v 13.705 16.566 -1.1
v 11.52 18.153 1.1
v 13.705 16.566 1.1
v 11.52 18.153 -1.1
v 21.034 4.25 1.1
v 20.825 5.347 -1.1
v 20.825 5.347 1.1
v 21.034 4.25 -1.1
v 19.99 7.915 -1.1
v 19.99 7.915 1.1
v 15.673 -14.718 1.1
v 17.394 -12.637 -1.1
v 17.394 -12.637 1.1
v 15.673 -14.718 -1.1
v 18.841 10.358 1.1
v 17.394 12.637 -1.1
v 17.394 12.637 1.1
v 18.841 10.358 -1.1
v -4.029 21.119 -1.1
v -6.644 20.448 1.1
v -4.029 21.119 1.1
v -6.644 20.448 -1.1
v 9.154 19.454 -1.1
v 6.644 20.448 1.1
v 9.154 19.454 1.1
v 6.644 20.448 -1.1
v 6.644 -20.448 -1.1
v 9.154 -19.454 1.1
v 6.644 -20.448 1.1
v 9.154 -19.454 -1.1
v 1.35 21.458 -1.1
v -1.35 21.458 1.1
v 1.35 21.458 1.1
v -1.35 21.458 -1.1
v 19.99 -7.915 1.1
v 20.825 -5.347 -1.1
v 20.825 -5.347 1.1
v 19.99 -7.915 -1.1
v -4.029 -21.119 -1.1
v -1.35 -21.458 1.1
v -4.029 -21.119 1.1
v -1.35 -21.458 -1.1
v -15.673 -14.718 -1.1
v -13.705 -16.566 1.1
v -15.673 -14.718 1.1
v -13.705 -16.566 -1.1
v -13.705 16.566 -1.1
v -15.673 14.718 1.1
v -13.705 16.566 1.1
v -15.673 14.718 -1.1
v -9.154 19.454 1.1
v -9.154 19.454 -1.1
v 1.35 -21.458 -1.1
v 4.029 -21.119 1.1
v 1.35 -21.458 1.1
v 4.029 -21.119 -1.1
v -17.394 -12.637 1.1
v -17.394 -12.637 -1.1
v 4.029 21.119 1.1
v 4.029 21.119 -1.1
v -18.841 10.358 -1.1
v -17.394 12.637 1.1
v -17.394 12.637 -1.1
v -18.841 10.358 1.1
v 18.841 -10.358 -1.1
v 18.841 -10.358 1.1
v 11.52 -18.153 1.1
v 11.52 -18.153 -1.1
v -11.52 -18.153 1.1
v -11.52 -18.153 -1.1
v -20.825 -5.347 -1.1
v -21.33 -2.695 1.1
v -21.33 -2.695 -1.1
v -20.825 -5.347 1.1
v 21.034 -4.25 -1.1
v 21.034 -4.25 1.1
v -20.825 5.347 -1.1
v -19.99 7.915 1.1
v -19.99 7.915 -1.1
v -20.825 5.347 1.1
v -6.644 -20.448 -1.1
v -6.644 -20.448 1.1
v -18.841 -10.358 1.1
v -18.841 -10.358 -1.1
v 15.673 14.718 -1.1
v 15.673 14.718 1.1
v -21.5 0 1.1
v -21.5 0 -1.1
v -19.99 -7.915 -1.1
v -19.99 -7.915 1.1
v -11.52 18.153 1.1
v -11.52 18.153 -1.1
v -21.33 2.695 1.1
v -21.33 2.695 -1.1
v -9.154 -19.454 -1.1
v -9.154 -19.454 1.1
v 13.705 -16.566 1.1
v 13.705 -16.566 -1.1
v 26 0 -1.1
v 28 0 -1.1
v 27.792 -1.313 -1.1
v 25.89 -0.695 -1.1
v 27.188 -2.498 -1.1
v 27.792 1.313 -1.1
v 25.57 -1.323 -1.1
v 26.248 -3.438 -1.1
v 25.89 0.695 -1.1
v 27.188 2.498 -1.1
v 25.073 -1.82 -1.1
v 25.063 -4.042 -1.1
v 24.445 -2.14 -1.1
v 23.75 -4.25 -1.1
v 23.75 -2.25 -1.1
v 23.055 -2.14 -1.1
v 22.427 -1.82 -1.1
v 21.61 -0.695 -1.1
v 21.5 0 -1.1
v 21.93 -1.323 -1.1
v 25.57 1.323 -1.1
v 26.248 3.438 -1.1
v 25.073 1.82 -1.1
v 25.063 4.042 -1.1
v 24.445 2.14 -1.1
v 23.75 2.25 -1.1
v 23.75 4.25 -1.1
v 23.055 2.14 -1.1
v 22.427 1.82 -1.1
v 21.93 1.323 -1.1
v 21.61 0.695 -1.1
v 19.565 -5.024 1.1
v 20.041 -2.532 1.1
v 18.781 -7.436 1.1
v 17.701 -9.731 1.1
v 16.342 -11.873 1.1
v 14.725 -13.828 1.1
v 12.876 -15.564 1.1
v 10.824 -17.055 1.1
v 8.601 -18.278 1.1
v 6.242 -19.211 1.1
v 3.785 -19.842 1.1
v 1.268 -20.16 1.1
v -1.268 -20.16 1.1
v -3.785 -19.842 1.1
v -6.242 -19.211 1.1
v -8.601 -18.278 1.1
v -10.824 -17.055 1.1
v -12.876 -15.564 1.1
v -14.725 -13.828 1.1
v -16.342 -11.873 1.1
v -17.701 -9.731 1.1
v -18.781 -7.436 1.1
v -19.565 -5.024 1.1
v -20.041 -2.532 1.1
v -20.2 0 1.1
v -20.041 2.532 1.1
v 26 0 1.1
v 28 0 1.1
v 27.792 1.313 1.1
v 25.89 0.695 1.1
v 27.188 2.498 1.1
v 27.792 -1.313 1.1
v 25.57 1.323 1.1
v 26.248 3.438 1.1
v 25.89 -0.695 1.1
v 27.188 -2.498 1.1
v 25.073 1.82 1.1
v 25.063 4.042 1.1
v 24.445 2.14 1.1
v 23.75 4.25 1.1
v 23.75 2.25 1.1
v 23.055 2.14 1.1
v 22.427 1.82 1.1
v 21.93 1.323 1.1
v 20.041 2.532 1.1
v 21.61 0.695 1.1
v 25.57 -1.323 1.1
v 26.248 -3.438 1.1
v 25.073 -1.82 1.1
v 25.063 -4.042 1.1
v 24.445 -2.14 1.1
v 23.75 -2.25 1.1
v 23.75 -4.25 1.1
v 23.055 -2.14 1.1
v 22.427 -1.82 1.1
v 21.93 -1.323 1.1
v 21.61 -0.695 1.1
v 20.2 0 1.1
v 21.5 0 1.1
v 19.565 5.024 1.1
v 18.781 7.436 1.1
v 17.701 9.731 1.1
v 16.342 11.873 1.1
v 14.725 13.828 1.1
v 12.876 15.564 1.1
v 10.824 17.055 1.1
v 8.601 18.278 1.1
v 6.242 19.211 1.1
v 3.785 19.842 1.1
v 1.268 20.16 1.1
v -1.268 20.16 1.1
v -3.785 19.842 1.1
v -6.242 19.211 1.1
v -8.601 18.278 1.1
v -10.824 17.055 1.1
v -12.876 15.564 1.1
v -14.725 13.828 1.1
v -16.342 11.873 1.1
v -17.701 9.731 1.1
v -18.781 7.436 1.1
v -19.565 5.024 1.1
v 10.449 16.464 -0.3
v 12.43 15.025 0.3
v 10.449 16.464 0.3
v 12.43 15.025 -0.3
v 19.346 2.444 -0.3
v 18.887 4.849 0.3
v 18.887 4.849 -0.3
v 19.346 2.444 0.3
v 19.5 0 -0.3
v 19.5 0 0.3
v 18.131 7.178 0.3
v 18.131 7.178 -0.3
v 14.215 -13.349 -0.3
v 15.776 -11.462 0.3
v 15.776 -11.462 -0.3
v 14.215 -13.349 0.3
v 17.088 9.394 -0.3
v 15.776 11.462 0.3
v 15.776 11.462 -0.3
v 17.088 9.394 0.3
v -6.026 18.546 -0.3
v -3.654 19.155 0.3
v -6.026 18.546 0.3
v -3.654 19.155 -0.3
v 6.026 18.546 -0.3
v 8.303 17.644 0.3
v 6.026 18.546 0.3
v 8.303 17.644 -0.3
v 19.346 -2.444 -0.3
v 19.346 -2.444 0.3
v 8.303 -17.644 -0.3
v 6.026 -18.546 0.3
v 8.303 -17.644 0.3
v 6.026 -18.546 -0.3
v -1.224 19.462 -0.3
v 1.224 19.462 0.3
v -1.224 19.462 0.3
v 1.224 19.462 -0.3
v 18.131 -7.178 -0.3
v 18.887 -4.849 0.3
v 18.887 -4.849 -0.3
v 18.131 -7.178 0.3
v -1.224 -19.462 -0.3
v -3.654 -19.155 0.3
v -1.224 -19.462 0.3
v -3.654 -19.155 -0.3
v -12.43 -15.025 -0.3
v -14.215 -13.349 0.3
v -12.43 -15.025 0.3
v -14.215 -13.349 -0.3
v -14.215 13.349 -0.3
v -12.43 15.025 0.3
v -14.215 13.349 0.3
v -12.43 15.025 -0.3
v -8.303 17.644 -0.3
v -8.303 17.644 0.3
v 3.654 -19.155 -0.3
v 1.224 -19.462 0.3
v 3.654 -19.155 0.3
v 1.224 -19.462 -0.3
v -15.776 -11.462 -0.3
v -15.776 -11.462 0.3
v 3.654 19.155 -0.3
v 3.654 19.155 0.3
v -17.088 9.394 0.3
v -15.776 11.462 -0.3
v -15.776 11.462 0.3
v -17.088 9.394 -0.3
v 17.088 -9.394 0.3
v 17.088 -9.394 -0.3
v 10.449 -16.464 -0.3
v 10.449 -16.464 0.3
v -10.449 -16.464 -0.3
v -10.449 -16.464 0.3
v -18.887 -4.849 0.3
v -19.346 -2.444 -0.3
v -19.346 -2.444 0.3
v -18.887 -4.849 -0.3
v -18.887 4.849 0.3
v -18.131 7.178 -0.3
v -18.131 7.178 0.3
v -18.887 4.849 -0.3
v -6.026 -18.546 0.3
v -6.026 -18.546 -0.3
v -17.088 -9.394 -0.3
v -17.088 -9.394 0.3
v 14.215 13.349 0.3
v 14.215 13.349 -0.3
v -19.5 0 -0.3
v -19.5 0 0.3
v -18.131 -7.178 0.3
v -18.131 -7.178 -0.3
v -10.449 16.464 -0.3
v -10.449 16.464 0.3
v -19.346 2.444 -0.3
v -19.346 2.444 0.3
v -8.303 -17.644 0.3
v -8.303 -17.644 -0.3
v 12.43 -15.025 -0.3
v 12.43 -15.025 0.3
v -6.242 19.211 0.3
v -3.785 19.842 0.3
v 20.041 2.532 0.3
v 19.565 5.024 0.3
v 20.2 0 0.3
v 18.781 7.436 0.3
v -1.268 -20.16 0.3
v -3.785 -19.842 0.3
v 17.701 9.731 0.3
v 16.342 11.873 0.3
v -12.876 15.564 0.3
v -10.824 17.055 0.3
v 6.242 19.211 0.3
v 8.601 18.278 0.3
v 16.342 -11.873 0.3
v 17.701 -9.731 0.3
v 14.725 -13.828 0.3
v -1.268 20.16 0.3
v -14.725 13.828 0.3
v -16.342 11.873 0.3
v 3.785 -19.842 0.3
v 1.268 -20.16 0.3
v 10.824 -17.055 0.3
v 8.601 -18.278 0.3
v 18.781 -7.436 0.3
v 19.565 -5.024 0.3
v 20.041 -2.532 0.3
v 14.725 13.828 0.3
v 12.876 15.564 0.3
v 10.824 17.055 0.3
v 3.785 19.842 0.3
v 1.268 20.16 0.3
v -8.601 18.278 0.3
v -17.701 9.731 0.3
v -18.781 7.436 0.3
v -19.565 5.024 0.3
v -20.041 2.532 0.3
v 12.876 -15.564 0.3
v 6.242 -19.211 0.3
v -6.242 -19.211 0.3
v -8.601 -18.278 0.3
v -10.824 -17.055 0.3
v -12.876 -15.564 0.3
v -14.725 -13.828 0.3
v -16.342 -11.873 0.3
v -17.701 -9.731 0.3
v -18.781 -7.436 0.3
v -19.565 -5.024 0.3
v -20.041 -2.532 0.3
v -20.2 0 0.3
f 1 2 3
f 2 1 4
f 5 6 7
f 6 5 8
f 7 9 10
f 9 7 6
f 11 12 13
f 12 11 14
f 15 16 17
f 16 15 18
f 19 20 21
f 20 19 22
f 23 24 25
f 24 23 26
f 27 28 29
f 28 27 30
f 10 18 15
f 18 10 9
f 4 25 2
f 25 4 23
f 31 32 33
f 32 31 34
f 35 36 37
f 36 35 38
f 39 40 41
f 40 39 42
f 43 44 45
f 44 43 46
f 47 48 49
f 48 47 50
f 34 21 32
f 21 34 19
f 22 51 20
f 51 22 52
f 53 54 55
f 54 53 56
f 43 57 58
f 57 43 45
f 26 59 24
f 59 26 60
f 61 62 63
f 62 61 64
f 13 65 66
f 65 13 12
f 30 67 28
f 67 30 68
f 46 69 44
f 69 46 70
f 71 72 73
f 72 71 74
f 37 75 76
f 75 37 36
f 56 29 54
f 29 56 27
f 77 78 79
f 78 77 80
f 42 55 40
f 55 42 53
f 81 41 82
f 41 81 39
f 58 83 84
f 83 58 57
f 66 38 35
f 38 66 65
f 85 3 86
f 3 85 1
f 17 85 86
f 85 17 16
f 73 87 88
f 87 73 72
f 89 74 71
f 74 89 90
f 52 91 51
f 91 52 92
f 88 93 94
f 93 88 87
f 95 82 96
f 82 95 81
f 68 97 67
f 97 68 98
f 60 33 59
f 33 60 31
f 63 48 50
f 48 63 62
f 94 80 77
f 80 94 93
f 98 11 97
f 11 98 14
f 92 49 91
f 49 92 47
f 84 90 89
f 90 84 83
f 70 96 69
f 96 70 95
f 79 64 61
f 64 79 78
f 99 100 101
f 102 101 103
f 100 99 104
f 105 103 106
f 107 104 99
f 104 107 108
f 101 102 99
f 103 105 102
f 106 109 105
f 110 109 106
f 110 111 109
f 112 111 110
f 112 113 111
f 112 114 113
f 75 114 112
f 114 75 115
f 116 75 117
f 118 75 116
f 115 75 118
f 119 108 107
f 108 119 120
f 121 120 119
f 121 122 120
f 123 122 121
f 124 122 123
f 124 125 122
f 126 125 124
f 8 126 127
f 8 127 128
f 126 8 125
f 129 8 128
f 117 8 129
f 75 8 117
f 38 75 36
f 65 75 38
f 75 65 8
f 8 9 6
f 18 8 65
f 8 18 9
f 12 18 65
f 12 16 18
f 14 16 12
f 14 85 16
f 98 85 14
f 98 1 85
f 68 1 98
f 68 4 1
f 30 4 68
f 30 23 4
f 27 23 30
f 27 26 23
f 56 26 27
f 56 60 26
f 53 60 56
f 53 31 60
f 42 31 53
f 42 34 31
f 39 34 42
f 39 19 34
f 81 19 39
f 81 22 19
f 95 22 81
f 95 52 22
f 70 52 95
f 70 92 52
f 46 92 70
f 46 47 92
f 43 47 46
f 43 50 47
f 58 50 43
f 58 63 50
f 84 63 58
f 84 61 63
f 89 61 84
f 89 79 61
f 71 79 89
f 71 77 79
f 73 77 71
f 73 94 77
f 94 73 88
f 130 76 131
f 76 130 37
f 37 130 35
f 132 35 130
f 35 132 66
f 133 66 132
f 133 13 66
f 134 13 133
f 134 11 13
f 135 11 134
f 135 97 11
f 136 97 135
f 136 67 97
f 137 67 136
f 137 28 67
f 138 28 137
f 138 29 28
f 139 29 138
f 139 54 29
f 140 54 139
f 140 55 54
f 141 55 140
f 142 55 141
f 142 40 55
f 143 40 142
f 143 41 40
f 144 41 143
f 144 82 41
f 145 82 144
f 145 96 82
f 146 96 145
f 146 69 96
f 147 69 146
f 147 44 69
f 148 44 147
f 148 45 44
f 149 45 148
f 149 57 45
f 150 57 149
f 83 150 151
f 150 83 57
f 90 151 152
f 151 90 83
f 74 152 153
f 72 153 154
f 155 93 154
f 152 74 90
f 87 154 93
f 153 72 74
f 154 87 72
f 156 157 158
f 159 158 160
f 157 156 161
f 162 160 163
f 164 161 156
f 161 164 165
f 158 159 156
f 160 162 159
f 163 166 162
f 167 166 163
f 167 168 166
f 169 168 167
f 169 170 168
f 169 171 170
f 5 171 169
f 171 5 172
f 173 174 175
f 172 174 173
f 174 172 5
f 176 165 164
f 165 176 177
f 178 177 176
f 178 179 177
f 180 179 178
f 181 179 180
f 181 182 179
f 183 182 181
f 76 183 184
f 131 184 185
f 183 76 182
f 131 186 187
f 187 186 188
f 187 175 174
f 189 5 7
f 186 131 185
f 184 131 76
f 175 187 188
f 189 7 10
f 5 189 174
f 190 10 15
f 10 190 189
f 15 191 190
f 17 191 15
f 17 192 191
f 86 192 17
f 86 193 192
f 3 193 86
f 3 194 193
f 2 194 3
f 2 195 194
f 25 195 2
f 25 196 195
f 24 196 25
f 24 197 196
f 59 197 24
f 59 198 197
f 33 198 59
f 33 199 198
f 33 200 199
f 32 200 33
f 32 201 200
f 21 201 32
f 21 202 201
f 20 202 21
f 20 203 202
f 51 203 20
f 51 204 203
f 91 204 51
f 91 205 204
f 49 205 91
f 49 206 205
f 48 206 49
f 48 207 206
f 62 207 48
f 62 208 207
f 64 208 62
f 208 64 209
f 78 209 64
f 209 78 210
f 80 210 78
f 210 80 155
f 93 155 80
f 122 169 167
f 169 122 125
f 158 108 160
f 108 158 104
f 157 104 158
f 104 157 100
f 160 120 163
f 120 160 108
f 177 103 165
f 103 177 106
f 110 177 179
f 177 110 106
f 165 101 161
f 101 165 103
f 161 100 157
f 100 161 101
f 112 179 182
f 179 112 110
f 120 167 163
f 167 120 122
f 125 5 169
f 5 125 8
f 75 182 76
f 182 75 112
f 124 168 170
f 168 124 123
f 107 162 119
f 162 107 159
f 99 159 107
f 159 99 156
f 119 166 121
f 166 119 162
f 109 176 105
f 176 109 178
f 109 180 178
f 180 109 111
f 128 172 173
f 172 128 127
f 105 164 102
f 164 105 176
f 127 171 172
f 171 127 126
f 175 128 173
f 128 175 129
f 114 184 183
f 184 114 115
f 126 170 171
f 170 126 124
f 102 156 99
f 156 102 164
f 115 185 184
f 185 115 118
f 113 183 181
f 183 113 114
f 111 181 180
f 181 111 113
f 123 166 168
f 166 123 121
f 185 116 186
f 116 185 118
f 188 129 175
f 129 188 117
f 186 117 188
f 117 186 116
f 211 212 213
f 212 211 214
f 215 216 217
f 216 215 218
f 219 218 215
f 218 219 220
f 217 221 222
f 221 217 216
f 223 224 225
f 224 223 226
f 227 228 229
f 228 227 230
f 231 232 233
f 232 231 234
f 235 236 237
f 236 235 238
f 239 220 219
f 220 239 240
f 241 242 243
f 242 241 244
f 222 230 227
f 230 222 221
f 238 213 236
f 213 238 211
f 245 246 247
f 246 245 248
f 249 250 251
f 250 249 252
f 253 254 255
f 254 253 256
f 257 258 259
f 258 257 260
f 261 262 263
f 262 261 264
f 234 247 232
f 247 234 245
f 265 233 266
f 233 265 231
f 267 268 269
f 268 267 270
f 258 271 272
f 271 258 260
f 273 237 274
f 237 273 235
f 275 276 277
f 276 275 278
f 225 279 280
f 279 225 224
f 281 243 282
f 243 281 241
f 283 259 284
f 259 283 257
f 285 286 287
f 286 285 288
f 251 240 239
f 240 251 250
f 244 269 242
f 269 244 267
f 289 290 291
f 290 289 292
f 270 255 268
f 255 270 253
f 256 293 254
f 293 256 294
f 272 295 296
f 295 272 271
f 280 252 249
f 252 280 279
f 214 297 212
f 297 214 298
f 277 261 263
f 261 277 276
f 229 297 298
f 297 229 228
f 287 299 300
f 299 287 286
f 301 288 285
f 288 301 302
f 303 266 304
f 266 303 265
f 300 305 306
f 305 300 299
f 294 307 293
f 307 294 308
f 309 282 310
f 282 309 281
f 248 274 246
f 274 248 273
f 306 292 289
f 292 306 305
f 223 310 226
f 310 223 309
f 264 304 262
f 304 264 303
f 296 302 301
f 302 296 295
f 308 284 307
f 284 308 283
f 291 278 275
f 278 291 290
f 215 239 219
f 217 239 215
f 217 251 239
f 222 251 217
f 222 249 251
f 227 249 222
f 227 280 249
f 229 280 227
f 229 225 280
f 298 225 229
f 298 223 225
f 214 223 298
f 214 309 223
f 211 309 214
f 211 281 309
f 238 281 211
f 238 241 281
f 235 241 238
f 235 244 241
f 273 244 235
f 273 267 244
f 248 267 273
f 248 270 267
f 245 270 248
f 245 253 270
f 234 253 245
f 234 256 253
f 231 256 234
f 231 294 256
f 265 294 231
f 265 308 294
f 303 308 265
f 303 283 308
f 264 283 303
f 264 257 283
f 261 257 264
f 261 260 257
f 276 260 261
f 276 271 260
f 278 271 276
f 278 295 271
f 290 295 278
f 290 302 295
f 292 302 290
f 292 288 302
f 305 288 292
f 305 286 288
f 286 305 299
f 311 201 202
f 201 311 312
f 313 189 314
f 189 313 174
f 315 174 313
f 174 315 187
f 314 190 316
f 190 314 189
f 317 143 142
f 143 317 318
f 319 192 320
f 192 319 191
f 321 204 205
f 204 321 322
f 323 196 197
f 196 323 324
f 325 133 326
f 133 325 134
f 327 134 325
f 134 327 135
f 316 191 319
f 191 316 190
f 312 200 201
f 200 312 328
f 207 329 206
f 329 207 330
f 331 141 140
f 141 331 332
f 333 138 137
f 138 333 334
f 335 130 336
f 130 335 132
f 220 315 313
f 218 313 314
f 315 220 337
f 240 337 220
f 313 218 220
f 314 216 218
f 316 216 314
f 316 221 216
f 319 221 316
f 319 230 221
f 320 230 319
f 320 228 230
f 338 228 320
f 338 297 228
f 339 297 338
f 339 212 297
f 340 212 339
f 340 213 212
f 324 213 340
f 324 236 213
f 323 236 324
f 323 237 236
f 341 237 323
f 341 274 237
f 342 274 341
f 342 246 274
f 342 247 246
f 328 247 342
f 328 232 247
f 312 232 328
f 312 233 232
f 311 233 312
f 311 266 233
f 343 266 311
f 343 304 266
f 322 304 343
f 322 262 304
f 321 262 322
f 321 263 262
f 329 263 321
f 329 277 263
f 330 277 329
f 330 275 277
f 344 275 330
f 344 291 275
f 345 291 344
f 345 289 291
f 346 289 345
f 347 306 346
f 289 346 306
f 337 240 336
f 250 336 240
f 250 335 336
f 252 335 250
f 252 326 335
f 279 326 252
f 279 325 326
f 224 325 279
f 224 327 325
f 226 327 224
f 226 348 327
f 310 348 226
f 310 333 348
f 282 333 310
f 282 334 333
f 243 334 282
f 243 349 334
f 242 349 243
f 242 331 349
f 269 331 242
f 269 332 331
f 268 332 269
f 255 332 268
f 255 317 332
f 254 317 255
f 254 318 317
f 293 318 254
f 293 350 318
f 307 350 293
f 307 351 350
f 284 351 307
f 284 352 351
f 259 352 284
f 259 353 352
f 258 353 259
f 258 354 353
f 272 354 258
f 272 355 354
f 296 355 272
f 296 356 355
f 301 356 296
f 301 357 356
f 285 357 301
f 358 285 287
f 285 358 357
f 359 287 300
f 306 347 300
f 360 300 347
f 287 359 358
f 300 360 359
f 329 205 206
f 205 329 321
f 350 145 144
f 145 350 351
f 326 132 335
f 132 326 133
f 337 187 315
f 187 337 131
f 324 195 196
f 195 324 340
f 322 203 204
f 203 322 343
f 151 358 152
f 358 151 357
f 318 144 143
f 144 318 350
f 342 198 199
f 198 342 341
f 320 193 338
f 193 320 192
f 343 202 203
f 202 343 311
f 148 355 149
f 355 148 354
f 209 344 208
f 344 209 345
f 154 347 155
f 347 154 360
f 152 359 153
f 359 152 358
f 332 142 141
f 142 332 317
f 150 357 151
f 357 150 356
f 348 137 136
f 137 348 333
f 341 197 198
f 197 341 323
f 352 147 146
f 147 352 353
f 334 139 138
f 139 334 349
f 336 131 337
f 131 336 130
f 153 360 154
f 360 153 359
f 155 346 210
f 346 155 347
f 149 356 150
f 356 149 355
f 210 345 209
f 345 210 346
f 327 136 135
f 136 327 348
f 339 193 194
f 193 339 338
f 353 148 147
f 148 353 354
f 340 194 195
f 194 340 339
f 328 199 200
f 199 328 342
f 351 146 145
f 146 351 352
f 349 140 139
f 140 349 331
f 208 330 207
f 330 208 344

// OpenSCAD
// [FL_INDEX: keywords="openscad, 3d_parametric, Customizable_NFC_Keyfob, csg_solid" | COT="Parametric OpenSCAD design from 3DCodeverse"]
// Title: Customizable NFC Keyfob

// Pasutx, 7.4.2013
// NFC keyfob
//
// Change these parameters:

CavityDiameter=39;
Part=0; // [0:Case, 1:Lid]
Shape=0;  // [0:Circle, 1:Square]

LidThickness=0.8;
CavityThickness=0.6;
BottomThickness=0.8;

SideWidth=2;
LidSupportWidth=0.7;

RingOutsideDiameter=8.5;
RingHoleDiameter=4.5;

Tolerance=0.15;

//Only relevant for square fobs
RoundingRadius=3; 

// Do NOT change these parameters:
OutsideRadius=CavityDiameter/2+SideWidth;
CavityRadius=CavityDiameter/2;
RingHoleRadius=RingHoleDiameter/2;
RingOutsideRadius=RingOutsideDiameter/2;
TotalThickness=LidThickness+CavityThickness+BottomThickness;
RingThickness=RingOutsideRadius-RingHoleRadius;


// Create a cube([X,Y,Z]) with rounded vertical edges (radius R)
module RoundedBox (X,Y,Z,R)
{
	intersection()
   {
	   minkowski()
		{
		 cube([X-2*R,Y-2*R,Z],center=true);
		 cylinder(r=R,h=Z,$fn=16,center=true);
		}
		cube([2*X,2*Y,Z],center=true);
	}
}

if (Shape==0)
{
	if (Part==0)
	{
		//Show Case
		difference()
		{
			union()
			{
				//main body
				cylinder(r=OutsideRadius,h=TotalThickness,center=true,$fn=50);
				//ring
				translate([OutsideRadius+RingOutsideRadius-SideWidth,0,0])
					cylinder(r=RingOutsideRadius,h=TotalThickness,center=true,$fn=20);
				//ring connection
				translate([OutsideRadius-SideWidth,0,0])
					cube(size=[2*RingOutsideRadius,2*RingOutsideRadius,TotalThickness],center=true);
			}
			//ring hole
			translate([OutsideRadius+RingOutsideRadius-SideWidth,0,0])
				cylinder(r=RingHoleRadius,h=2*TotalThickness,center=true,$fn=20);
			//nfc cavity
			translate([0,0,BottomThickness])
				cylinder(r=CavityRadius,h=TotalThickness,center=true,$fn=50);
			//lid cavity
			translate([0,0,BottomThickness+CavityThickness])
				cylinder(r=CavityRadius+LidSupportWidth,h=TotalThickness,center=true,$fn=50);
		}
	}
	else
	{
		//Show Lid
		cylinder(r=CavityRadius+LidSupportWidth-Tolerance, h=LidThickness);
	}
}
else
{
	if (Part==0)
	{
		//Show Case
		difference()
		{
			union()
			{
				//main body
				RoundedBox (2*OutsideRadius,2*OutsideRadius,TotalThickness,RoundingRadius);
				//ring
				translate([OutsideRadius+RingOutsideRadius-SideWidth,0,0])
					cylinder(r=RingOutsideRadius,h=TotalThickness,center=true,$fn=20);
				//ring connection
				translate([OutsideRadius-SideWidth,0,0])
					cube(size=[2*RingOutsideRadius,2*RingOutsideRadius,TotalThickness],center=true);
			}
			//ring hole
			translate([OutsideRadius+RingOutsideRadius-SideWidth,0,0])
				cylinder(r=RingHoleRadius,h=2*TotalThickness,center=true,$fn=20);
			//nfc cavity
			translate([0,0,BottomThickness])
				RoundedBox(2*CavityRadius,2*CavityRadius,TotalThickness,RoundingRadius);
			//lid cavity
			translate([0,0,BottomThickness+CavityThickness])
				RoundedBox(2*(CavityRadius+LidSupportWidth),2*(CavityRadius+LidSupportWidth),TotalThickness,RoundingRadius);
		}
	}
	else
	{
		//Show Lid
		RoundedBox(2*(CavityRadius+LidSupportWidth-Tolerance),2*(CavityRadius+LidSupportWidth-Tolerance),LidThickness,RoundingRadius);
	}
}
